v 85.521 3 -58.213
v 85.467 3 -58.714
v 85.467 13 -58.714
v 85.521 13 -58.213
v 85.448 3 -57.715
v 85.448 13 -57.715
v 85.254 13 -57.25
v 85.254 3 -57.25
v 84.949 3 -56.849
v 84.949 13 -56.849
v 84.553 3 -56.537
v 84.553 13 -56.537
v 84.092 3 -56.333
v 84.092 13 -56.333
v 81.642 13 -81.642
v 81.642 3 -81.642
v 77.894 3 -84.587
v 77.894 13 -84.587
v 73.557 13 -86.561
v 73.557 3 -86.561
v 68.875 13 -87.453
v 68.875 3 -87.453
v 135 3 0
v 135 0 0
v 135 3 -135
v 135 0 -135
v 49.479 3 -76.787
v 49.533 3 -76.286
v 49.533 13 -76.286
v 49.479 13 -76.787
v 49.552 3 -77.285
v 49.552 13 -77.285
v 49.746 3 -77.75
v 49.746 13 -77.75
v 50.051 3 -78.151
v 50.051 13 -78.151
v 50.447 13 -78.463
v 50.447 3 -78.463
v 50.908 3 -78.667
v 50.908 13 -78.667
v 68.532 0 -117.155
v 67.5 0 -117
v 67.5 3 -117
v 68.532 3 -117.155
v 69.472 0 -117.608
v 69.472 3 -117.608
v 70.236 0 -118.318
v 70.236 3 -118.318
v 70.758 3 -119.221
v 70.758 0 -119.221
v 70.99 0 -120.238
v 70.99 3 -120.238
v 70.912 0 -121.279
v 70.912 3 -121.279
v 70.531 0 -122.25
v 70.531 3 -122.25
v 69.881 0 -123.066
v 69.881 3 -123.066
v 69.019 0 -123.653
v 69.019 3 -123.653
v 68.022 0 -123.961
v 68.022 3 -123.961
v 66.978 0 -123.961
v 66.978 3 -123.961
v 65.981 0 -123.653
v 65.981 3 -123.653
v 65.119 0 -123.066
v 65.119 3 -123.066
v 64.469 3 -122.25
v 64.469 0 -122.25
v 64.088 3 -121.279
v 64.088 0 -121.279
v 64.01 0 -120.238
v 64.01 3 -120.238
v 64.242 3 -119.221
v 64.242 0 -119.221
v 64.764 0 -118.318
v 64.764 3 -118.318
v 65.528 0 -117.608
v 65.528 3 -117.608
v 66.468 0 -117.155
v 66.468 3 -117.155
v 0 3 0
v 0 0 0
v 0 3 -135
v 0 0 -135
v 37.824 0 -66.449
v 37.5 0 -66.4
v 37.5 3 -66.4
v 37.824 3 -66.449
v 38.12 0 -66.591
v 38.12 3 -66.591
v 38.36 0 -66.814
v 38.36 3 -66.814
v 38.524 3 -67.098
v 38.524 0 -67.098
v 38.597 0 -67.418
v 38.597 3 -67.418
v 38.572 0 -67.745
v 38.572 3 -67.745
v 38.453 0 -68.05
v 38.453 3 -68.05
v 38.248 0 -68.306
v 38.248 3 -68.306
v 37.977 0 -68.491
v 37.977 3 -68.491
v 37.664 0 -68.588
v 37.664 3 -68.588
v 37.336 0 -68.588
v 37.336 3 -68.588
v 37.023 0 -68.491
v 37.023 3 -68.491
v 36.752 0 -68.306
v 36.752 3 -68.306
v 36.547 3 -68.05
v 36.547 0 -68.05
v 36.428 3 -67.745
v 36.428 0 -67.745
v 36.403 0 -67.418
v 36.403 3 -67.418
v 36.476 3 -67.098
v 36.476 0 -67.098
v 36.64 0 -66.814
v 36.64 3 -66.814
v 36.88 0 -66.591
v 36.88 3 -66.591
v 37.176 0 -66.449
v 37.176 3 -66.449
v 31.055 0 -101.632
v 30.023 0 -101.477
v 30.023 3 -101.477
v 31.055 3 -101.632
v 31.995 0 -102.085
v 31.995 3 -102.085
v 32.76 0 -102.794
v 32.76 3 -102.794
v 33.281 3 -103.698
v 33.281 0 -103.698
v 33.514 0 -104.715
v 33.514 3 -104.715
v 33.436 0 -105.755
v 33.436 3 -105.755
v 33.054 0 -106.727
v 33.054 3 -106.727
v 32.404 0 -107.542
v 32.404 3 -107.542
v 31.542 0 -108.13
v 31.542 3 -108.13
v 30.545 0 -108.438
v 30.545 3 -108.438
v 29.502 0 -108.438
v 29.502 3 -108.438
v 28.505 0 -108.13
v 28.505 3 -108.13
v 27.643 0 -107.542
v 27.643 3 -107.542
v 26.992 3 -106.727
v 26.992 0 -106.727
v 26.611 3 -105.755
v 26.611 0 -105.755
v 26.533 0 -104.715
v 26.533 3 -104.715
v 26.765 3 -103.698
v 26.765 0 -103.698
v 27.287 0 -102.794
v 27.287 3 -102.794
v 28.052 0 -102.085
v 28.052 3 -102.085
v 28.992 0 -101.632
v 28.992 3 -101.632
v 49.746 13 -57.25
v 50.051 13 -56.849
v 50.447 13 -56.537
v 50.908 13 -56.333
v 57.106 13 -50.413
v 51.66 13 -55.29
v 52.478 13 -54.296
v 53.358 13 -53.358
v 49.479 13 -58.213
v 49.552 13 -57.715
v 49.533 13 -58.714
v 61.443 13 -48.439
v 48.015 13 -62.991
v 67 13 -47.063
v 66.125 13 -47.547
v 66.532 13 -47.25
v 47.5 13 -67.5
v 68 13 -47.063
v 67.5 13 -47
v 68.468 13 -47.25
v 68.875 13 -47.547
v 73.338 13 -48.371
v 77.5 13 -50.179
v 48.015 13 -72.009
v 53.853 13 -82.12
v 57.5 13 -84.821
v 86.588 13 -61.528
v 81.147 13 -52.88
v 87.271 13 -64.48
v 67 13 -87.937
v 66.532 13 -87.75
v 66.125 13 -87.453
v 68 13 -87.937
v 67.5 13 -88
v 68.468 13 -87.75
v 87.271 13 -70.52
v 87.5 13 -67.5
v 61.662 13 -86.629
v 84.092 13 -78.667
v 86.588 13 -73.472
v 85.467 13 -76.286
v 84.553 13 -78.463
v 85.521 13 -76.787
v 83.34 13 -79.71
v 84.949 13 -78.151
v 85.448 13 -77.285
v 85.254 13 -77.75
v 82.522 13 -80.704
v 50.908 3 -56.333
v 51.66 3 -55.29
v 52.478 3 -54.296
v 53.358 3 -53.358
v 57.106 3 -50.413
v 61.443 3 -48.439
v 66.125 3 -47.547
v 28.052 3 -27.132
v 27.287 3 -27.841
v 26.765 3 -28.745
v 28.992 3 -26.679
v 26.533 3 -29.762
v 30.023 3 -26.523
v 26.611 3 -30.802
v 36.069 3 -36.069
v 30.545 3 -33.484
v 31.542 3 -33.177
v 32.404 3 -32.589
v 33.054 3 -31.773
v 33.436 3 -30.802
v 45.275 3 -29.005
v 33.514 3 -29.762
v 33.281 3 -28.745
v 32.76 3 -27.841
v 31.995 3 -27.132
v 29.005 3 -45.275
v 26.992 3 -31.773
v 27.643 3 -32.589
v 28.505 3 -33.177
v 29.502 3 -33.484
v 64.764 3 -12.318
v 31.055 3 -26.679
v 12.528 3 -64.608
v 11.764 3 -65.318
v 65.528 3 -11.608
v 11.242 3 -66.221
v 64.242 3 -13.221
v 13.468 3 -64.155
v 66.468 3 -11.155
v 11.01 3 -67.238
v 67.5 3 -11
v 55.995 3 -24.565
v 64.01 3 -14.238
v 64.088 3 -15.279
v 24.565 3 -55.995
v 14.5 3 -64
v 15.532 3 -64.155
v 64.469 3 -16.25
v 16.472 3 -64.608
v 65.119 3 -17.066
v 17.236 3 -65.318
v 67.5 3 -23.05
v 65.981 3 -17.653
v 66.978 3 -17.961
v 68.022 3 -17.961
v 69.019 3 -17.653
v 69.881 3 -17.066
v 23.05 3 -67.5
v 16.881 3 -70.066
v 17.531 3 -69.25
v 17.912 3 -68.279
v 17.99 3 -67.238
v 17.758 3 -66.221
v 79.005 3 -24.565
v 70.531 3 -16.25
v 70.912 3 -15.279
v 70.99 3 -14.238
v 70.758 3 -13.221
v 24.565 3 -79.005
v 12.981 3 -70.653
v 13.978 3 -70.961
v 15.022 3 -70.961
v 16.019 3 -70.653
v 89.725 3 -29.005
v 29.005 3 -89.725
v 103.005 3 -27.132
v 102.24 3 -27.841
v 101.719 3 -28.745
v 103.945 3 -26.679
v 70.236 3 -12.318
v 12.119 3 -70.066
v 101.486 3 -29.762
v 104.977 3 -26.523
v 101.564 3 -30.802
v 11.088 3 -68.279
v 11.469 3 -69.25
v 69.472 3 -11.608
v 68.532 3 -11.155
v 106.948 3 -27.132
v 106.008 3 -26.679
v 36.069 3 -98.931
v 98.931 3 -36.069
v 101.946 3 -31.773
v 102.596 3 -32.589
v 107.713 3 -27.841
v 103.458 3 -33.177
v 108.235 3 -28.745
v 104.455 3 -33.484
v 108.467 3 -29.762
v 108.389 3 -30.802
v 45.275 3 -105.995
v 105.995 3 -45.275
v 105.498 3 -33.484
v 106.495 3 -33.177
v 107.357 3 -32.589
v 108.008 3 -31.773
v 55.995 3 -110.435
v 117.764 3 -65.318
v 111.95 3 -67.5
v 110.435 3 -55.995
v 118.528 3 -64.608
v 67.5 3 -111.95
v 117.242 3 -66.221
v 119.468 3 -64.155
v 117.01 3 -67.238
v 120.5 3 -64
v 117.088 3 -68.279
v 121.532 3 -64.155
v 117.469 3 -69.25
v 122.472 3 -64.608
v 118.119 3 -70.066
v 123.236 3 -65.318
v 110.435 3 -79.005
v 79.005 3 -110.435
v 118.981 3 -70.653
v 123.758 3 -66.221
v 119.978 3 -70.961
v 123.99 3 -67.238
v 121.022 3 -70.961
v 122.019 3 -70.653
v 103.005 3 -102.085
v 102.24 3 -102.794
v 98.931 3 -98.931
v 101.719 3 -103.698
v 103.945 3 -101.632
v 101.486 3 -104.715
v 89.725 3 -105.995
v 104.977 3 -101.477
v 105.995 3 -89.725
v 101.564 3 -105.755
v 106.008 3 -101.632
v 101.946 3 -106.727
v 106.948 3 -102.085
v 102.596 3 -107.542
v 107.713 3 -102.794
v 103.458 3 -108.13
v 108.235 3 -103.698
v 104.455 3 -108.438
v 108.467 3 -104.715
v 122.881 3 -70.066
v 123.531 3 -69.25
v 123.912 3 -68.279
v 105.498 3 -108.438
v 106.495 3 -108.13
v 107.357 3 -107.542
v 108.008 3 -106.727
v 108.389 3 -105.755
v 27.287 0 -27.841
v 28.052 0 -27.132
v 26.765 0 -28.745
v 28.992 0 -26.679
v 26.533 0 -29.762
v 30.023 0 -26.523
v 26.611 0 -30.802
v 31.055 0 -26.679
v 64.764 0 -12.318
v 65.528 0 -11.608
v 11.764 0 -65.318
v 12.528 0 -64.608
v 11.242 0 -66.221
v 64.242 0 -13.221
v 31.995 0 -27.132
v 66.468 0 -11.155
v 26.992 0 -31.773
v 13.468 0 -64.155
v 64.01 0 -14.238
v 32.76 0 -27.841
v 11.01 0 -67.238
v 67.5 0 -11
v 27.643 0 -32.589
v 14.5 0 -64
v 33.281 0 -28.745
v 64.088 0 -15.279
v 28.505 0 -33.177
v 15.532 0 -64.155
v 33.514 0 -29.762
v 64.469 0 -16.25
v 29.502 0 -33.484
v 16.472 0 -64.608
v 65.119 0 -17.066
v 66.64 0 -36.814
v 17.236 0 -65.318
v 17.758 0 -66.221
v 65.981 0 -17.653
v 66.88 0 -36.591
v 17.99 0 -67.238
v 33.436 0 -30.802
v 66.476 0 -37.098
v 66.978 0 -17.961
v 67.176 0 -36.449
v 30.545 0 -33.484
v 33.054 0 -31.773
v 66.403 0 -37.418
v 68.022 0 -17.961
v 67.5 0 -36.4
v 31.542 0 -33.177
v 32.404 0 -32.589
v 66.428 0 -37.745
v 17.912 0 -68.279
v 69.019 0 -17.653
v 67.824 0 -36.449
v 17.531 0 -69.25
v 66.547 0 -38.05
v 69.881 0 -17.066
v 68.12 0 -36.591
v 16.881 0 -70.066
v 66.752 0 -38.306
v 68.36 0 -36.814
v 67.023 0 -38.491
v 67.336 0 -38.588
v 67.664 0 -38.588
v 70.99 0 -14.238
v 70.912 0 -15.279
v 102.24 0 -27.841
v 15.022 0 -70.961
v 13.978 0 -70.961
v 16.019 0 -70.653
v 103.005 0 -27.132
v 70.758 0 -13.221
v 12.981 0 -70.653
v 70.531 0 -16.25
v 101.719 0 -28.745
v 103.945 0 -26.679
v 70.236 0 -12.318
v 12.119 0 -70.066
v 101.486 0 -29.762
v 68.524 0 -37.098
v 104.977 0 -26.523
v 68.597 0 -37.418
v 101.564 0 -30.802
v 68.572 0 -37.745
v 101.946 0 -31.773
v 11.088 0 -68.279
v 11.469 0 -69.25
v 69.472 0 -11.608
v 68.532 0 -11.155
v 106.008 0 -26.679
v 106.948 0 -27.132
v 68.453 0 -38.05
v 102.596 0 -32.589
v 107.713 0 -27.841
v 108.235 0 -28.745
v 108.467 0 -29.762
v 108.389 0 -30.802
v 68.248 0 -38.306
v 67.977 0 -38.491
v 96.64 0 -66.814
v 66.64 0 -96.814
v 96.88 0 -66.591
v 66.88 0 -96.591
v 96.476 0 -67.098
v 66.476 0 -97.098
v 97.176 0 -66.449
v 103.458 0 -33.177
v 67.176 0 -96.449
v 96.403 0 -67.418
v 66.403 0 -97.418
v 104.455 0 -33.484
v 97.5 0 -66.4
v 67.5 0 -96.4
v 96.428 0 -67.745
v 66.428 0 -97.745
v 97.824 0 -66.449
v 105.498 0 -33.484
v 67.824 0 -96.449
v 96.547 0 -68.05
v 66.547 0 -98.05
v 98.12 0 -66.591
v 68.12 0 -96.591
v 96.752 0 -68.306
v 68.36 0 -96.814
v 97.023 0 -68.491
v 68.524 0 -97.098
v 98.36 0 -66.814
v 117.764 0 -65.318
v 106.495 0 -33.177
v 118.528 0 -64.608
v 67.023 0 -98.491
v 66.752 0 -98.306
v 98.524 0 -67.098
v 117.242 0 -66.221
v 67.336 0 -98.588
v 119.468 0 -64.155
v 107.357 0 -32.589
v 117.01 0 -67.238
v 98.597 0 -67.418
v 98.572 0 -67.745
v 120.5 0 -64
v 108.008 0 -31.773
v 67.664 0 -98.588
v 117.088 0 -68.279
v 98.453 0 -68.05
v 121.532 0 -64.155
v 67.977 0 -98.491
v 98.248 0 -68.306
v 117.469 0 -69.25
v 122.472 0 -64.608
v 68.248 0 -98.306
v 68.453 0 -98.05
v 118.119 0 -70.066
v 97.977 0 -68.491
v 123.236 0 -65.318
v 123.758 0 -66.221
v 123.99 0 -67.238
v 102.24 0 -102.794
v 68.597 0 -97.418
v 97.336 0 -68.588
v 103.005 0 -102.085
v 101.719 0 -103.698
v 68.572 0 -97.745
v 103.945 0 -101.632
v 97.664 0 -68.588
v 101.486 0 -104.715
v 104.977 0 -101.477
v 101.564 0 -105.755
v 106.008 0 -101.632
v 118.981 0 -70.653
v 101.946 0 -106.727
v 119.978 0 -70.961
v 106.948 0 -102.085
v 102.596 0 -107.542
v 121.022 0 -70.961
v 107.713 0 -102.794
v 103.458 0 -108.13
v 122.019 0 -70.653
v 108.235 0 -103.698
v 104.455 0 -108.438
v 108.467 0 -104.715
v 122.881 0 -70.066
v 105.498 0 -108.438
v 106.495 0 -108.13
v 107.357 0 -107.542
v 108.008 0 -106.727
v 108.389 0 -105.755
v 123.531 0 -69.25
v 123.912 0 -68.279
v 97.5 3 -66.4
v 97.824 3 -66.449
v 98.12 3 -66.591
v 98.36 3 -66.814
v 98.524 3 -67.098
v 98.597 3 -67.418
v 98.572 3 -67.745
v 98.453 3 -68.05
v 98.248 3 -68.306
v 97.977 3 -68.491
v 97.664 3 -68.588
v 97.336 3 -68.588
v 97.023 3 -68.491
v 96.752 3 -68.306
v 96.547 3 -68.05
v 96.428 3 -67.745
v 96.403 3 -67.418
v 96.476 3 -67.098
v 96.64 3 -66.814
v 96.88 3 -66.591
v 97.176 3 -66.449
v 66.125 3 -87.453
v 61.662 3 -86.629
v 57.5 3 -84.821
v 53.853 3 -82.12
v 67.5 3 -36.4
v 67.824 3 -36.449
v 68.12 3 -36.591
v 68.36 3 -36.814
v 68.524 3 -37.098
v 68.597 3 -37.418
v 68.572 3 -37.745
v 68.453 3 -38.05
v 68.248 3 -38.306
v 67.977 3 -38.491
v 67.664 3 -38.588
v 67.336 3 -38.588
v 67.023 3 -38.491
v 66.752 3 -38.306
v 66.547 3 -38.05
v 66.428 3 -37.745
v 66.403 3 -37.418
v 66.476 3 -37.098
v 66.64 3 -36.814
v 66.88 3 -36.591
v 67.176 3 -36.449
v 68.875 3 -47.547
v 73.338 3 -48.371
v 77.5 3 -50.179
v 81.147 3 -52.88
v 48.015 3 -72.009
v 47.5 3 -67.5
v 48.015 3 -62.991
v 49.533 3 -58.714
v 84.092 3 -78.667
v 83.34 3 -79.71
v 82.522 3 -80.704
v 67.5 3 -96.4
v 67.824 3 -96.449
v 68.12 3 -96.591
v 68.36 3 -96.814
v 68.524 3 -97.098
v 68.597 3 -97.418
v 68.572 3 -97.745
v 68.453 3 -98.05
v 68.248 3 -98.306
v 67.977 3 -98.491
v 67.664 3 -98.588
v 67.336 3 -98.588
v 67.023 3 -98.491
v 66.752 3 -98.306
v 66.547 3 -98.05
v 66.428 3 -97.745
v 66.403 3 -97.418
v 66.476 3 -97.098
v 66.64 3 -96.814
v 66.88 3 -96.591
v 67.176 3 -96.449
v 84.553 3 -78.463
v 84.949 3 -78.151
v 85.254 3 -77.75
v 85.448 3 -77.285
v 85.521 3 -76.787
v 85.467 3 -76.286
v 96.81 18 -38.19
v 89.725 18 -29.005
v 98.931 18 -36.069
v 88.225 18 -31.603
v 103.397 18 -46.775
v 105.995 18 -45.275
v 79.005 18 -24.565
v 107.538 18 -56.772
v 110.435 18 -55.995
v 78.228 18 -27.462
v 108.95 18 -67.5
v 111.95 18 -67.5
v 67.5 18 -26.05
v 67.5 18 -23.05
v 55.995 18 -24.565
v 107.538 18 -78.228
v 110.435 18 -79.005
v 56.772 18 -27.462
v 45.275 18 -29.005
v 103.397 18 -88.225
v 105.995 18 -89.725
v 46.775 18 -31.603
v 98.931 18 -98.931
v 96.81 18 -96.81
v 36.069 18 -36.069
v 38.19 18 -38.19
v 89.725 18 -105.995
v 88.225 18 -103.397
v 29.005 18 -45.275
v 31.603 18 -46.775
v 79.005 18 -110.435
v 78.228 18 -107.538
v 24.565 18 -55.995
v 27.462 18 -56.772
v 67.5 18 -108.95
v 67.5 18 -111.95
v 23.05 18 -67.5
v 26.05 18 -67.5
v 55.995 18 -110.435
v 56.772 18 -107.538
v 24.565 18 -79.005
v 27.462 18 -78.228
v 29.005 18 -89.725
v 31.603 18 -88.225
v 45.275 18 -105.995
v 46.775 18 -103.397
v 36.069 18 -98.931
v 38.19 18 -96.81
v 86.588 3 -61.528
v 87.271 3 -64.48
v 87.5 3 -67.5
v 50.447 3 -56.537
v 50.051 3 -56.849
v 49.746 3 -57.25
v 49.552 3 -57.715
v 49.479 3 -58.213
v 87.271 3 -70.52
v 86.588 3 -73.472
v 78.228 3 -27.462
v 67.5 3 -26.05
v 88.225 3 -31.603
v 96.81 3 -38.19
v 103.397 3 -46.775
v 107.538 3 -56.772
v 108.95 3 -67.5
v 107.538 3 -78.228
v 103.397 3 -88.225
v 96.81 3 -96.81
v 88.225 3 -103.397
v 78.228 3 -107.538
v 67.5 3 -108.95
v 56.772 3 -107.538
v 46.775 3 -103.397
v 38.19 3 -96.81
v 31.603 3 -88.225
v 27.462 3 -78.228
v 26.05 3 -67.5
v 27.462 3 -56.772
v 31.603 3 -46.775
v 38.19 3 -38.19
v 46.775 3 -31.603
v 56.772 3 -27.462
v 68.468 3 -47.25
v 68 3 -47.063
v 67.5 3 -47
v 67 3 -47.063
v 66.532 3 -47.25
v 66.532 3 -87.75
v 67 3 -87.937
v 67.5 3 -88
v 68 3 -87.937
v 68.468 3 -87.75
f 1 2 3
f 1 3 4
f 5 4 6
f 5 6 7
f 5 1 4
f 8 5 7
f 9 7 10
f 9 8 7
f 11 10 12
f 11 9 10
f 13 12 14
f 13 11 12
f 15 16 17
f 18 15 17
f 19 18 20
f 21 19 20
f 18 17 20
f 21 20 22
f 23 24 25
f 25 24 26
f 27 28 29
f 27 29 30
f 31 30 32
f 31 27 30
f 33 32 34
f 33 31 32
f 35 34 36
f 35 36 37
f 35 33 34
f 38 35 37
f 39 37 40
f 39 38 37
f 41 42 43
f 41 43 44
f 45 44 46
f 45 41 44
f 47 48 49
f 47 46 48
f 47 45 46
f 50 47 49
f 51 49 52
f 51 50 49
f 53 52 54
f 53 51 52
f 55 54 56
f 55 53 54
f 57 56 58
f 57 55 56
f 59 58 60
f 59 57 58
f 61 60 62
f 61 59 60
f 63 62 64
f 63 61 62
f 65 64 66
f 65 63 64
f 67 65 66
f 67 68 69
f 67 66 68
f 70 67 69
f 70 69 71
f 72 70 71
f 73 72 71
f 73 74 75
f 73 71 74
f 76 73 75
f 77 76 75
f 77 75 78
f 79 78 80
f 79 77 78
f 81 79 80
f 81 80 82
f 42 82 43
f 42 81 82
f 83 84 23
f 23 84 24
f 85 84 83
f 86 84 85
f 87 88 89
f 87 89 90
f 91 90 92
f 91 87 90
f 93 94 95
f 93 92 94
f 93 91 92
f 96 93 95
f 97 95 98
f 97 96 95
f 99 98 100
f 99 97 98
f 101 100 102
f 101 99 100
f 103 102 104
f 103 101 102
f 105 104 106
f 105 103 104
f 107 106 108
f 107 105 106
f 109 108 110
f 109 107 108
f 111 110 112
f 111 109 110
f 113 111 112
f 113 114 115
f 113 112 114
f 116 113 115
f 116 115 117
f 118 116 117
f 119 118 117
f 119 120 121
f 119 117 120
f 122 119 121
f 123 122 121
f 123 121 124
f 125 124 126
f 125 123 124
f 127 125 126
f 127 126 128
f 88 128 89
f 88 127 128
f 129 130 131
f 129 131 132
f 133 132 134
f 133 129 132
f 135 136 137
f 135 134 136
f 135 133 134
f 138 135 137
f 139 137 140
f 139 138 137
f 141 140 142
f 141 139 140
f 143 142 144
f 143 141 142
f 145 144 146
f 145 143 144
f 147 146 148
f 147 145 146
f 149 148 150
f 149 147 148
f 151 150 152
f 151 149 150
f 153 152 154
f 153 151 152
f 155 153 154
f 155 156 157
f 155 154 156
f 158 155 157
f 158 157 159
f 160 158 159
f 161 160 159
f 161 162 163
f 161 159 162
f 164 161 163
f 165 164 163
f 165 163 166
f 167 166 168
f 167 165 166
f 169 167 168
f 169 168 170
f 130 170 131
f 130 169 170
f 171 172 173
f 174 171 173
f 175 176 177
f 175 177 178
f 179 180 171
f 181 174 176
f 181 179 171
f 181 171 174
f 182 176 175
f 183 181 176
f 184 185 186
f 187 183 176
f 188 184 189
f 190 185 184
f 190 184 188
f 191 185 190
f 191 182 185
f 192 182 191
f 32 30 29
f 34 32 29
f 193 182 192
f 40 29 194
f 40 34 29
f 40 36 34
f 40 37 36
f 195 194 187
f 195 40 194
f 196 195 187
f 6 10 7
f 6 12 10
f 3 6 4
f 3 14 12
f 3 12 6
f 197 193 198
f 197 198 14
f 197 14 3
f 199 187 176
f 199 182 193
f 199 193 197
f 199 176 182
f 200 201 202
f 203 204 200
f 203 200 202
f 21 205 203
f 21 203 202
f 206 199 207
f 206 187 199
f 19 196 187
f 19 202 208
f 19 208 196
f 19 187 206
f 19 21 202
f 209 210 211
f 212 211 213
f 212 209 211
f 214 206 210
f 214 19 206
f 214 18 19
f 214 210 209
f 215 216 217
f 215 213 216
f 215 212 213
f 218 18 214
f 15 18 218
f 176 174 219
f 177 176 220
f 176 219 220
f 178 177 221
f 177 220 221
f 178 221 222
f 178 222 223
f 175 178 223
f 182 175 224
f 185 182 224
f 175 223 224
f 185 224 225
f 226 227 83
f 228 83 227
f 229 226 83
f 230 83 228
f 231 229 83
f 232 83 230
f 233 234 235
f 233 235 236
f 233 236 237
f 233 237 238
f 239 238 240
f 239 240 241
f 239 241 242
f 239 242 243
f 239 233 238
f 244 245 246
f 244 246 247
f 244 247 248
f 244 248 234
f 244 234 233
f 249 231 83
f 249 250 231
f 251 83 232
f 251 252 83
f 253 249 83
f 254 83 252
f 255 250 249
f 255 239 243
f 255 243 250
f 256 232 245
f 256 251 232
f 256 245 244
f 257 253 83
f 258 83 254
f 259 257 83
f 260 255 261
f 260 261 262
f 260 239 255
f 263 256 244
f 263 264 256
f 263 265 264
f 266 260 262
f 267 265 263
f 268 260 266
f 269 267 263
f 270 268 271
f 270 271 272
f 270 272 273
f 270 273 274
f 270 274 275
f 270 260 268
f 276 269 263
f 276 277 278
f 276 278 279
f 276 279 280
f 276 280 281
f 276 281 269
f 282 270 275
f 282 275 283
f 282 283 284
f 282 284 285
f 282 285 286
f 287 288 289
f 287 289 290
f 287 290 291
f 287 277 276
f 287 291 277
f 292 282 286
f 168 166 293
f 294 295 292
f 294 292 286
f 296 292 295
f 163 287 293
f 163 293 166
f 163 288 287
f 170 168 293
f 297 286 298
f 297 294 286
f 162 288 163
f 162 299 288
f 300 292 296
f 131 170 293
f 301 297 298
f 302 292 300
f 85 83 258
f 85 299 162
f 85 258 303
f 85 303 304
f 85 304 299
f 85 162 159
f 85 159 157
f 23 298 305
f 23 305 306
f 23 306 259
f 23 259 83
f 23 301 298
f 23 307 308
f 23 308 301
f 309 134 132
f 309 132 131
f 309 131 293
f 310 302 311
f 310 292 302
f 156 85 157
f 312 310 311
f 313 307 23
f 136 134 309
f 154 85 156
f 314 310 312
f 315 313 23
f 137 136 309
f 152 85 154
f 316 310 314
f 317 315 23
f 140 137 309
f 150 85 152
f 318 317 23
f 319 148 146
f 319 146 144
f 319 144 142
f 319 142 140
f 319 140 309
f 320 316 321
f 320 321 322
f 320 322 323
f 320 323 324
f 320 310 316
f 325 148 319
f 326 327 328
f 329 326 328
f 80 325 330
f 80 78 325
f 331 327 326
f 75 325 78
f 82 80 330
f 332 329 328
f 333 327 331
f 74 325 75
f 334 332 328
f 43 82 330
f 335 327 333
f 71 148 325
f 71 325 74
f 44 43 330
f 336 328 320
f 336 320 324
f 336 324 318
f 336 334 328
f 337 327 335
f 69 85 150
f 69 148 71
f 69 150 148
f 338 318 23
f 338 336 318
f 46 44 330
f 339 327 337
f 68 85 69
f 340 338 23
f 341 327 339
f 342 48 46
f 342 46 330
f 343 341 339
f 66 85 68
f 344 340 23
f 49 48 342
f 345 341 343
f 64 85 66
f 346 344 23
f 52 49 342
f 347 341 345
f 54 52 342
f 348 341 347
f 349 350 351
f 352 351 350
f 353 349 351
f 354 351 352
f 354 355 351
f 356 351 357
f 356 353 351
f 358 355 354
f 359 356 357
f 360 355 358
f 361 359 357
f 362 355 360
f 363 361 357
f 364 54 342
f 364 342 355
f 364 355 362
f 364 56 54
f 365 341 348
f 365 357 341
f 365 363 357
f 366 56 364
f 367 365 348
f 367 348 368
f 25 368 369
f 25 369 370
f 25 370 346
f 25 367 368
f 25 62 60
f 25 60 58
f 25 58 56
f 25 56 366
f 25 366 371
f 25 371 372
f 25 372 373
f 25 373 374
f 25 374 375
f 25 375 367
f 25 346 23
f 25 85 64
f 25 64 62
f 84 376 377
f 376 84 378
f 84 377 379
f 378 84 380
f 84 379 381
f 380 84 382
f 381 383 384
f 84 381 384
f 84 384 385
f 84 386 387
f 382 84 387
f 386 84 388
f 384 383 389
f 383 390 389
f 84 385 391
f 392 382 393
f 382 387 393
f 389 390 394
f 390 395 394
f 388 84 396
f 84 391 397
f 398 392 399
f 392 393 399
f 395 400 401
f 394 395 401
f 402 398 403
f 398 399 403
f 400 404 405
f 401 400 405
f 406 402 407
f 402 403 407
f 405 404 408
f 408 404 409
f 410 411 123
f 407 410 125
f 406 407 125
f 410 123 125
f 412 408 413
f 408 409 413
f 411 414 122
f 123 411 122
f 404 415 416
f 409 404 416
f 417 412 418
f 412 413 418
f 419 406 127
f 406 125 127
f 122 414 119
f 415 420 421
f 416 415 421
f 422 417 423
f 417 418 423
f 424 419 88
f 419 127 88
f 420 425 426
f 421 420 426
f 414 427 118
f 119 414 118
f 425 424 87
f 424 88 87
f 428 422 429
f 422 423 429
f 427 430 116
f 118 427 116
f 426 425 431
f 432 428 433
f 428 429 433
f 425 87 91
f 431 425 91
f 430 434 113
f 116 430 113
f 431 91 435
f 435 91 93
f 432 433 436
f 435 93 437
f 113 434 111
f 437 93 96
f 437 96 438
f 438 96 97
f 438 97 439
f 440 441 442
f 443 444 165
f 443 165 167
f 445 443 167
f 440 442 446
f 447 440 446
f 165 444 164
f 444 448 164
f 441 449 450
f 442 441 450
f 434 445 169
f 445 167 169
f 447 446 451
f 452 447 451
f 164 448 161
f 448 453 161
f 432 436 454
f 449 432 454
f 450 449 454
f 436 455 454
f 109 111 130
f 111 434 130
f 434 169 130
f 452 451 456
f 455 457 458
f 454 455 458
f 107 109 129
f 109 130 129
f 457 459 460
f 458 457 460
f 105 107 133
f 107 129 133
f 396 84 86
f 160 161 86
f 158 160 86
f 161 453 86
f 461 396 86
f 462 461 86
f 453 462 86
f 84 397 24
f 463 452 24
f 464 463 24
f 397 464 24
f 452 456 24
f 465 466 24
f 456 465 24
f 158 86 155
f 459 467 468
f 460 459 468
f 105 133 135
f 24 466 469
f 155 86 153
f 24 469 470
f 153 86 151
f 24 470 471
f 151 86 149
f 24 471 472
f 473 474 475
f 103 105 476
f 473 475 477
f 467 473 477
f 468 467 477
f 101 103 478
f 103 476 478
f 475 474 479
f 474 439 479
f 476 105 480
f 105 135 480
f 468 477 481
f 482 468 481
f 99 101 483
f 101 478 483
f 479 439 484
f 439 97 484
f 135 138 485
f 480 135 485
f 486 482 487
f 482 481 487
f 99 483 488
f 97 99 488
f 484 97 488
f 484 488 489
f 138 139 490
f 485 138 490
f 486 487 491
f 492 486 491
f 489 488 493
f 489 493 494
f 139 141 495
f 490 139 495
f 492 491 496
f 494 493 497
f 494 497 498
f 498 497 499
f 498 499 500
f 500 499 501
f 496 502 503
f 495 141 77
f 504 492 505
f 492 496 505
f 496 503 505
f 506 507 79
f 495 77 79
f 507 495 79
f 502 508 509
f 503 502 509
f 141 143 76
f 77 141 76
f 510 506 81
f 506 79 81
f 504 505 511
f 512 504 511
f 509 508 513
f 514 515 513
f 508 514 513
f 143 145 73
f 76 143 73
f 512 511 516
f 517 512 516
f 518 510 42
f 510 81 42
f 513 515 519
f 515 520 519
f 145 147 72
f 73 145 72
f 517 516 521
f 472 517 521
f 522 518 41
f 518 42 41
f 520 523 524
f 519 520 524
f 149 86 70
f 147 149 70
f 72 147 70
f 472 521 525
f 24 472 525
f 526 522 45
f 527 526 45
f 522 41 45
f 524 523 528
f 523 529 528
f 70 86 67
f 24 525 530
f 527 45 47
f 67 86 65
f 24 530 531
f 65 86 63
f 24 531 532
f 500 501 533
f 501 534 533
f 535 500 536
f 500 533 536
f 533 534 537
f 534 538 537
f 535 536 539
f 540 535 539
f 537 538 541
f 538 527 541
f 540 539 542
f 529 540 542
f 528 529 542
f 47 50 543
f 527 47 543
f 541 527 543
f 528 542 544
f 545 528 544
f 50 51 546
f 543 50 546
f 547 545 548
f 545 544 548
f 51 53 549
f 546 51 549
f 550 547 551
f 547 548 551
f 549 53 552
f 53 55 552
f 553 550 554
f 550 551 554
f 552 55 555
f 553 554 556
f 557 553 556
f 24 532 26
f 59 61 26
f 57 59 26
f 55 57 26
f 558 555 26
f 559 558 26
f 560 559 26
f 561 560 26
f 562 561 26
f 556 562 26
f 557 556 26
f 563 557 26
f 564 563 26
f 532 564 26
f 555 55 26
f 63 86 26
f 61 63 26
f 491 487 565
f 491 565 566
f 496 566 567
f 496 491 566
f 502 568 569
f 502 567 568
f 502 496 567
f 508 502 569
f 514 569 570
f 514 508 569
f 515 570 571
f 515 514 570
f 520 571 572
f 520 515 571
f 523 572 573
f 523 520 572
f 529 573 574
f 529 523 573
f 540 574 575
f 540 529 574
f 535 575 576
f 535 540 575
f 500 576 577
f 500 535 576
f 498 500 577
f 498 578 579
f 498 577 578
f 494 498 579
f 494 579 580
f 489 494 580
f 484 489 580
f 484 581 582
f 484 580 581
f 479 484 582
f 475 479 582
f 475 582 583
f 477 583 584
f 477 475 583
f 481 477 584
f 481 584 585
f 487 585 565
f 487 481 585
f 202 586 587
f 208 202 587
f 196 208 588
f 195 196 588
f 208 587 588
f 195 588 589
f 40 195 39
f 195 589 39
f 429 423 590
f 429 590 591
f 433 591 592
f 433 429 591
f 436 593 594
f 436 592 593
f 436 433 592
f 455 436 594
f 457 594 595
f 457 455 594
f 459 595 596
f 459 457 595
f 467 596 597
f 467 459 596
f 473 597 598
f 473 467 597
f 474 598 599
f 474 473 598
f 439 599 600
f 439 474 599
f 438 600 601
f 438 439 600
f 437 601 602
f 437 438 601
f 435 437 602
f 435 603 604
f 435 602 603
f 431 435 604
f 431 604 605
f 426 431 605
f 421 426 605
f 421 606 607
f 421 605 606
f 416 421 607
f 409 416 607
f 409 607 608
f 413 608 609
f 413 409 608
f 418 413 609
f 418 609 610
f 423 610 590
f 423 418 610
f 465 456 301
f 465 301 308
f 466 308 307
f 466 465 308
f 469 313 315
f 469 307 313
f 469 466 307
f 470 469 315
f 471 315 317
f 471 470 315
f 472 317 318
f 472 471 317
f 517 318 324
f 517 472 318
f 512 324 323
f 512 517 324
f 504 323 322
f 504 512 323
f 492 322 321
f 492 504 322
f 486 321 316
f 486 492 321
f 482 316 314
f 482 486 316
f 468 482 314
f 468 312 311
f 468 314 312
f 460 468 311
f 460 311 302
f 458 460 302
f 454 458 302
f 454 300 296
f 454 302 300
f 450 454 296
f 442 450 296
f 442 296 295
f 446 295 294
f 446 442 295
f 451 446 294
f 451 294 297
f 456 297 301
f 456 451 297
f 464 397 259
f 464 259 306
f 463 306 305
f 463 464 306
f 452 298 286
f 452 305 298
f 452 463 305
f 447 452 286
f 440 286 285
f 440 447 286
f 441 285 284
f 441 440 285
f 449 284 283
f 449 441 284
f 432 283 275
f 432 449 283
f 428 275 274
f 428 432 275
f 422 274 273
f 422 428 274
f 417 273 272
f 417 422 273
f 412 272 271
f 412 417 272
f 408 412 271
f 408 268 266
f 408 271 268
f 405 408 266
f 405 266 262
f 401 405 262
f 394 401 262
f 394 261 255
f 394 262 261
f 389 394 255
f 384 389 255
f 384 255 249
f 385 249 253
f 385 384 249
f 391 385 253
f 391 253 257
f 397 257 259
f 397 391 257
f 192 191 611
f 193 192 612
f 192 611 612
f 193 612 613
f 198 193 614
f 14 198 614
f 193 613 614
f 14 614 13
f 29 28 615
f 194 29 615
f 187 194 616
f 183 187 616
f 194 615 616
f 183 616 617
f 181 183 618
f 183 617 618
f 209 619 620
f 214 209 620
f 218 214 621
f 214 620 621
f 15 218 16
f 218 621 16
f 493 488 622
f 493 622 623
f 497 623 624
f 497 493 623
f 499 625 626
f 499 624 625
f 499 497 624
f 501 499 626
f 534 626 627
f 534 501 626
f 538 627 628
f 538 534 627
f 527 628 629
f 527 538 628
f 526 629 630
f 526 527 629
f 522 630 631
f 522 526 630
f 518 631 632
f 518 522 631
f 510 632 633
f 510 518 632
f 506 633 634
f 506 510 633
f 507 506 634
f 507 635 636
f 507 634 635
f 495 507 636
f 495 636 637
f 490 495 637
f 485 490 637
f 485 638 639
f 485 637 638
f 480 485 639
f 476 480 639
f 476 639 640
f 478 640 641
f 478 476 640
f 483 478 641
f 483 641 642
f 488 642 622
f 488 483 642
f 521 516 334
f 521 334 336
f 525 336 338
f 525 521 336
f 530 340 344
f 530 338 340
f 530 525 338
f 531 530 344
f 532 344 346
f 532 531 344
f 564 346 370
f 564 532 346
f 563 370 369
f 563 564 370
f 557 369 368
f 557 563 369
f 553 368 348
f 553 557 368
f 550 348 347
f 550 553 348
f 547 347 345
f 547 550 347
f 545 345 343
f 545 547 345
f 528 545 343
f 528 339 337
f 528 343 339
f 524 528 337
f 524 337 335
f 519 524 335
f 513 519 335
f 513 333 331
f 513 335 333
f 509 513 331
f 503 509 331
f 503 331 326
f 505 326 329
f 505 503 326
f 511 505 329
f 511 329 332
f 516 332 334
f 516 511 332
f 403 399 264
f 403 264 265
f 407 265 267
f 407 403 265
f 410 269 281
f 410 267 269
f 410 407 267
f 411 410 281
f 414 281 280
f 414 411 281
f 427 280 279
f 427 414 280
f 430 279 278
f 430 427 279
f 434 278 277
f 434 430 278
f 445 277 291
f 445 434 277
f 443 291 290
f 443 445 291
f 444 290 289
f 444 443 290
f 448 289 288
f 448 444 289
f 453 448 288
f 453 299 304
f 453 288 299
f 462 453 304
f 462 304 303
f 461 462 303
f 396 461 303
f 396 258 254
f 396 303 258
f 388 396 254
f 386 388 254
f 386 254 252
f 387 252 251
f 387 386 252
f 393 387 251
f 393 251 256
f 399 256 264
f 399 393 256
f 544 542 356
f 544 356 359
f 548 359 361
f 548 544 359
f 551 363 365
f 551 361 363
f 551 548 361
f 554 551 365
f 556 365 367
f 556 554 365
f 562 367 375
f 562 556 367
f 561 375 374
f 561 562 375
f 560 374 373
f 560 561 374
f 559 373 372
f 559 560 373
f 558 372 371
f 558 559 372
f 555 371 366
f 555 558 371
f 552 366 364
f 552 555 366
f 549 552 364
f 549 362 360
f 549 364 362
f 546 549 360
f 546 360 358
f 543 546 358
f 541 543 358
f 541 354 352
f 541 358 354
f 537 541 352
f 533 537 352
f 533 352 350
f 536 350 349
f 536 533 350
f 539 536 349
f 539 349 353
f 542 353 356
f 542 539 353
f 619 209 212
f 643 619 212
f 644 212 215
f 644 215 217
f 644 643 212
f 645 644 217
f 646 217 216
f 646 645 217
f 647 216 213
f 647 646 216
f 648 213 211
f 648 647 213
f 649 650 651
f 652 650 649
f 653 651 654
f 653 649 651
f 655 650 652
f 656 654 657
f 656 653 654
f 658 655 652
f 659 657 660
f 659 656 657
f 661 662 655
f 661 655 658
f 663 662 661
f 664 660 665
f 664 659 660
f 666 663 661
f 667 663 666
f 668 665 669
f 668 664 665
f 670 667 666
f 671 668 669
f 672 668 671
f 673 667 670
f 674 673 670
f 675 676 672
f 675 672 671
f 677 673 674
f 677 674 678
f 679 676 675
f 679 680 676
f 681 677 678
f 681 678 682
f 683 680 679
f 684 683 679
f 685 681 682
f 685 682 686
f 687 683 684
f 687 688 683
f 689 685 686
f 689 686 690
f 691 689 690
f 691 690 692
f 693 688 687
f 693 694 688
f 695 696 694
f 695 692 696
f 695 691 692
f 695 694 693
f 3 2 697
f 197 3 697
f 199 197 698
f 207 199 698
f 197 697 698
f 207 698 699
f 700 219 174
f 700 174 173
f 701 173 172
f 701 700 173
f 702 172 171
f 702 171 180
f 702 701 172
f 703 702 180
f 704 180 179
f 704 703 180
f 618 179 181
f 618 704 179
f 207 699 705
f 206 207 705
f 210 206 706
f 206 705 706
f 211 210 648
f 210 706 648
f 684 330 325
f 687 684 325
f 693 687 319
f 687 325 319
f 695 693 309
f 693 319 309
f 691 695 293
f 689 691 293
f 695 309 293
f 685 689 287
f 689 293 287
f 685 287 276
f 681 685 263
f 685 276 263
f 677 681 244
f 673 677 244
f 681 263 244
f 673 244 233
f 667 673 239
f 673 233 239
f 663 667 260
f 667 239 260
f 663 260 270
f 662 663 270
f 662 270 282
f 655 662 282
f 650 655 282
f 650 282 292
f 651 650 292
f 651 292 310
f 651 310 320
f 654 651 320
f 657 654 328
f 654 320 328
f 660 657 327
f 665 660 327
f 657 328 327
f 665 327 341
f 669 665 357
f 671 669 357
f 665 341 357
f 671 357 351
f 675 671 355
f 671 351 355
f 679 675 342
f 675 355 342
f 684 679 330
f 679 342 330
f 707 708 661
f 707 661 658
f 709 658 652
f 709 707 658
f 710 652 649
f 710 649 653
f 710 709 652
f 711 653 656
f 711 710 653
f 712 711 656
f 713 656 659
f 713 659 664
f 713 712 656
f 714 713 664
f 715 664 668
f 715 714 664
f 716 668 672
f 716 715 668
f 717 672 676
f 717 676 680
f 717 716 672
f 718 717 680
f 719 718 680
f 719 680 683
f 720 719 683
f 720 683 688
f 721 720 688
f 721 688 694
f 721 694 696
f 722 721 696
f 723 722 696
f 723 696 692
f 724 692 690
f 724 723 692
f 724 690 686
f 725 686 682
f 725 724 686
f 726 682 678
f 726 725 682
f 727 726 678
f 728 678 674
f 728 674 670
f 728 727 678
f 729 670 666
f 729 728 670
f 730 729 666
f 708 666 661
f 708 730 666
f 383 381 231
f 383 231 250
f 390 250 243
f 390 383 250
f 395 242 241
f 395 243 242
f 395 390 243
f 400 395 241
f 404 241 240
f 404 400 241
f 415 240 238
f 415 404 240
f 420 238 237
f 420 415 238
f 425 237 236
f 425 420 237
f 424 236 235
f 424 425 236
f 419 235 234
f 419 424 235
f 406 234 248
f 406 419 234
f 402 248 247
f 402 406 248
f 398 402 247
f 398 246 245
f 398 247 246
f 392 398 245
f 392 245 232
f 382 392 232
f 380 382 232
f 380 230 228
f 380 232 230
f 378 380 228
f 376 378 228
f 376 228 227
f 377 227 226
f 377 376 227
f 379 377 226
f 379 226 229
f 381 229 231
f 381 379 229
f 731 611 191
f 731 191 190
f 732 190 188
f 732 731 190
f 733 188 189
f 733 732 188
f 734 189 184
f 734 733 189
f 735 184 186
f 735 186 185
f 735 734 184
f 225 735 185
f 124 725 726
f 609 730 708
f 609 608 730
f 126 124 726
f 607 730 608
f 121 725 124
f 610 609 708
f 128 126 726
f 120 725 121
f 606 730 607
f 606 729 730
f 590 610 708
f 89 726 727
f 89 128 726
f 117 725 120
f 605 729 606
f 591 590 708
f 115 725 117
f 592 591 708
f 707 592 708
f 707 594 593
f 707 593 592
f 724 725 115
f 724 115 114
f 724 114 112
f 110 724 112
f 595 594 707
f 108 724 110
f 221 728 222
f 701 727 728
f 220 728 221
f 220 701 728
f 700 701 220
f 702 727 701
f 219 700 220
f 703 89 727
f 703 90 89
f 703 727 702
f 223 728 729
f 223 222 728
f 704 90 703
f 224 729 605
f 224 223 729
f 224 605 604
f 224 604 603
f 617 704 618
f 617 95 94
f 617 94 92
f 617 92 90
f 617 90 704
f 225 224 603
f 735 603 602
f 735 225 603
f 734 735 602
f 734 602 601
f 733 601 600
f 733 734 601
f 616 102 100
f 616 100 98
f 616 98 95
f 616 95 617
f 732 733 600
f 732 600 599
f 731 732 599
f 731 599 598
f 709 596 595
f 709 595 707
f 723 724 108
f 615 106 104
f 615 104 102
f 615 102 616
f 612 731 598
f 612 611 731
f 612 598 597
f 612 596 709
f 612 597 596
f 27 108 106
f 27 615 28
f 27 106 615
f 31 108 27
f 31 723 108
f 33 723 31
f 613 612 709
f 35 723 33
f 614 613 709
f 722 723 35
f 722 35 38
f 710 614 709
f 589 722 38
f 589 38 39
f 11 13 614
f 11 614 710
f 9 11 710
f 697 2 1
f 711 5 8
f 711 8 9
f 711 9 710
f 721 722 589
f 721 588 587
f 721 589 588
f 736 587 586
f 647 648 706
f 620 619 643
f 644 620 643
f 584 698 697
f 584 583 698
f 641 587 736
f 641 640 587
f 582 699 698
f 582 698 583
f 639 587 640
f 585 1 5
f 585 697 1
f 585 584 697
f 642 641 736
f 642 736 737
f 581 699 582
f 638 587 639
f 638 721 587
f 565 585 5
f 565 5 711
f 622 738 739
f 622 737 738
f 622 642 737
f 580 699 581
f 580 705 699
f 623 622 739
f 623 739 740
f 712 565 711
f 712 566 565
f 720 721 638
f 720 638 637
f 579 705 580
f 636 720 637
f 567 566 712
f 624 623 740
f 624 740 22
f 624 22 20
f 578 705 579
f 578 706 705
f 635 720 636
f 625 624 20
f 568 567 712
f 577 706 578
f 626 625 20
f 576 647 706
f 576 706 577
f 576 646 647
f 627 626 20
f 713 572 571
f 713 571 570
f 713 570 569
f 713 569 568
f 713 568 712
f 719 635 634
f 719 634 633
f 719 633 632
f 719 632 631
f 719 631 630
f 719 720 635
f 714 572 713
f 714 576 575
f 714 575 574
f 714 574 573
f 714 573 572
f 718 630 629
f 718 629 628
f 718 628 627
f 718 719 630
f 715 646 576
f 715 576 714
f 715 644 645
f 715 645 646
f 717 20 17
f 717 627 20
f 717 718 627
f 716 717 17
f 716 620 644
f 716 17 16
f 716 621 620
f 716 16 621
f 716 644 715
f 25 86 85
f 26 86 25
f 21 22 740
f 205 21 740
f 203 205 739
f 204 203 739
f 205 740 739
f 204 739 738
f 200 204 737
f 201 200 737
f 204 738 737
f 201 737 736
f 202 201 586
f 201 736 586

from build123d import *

# Parameters (mm, degrees)
SKETCH1_W               = 135
SKETCH1_H               = 135
BOSS_EXTRUDE1_DEPTH     = 3
BOSS_EXTRUDE2_DEPTH     = 10
SKETCH3_R               = 44.45
SKETCH3_R_2             = 41.45
BOSS_EXTRUDE3_DEPTH     = 15
CUT_EXTRUDE1_DEPTH      = 192.507180022
CUT_EXTRUDE1_DEPTH_BACK = 192.507180022
SKETCH4_R               = 1.1
CUT_EXTRUDE2_DEPTH      = 192.507180022
CUT_EXTRUDE2_DEPTH_BACK = 192.507180022
SKETCH5_R               = 3.5


with BuildPart() as part:
    # Sketch1 → Boss-Extrude1 (new body)
    with BuildSketch(Plane(origin=(0, 0, 0), x_dir=(1, 0, 0), z_dir=(0, 1, 0))):
        with Locations((67.5, 67.5)):
            Rectangle(SKETCH1_W, SKETCH1_H)
    extrude(amount=BOSS_EXTRUDE1_DEPTH)

    # Sketch2 → Boss-Extrude2 (add)
    with BuildSketch(Plane(origin=(0, 3, 0), x_dir=(1, 0, 0), z_dir=(0, 1, 0))):
        with BuildLine():
            ThreePointArc((50.907776173, 56.333169273), (52.06098052, 54.786358606), (53.357864376, 53.357864376))
            Line((53.357864376, 53.357864376), (81.642135624, 81.642135624))
            ThreePointArc((81.642135624, 81.642135624), (75.784522289, 85.703480174), (68.874647176, 87.452702703))
            ThreePointArc((68.874647176, 87.452702703), (67.5, 87.5), (66.125352824, 87.452702703))
            ThreePointArc((66.125352824, 87.452702703), (57.5, 84.820508076), (50.907776173, 78.666830727))
            ThreePointArc((50.907776173, 78.666830727), (50.179491924, 77.5), (49.533128997, 76.285871976))
            ThreePointArc((49.533128997, 76.285871976), (47.5, 67.5), (49.533128997, 58.714128024))
            ThreePointArc((49.533128997, 58.714128024), (50.179491924, 57.5), (50.907776173, 56.333169273))
        make_face()
        with BuildLine():
            Line((81.642135624, 81.642135624), (53.357864376, 53.357864376))
            ThreePointArc((53.357864376, 53.357864376), (59.215477711, 49.296519826), (66.125352824, 47.547297297))
            ThreePointArc((66.125352824, 47.547297297), (67.5, 47.5), (68.874647176, 47.547297297))
            ThreePointArc((68.874647176, 47.547297297), (77.5, 50.179491924), (84.092223827, 56.333169273))
            ThreePointArc((84.092223827, 56.333169273), (84.820508076, 57.5), (85.466871003, 58.714128024))
            ThreePointArc((85.466871003, 58.714128024), (86.985089428, 62.990976827), (87.5, 67.5))
            ThreePointArc((87.5, 67.5), (86.985089428, 72.009023173), (85.466871003, 76.285871976))
            ThreePointArc((85.466871003, 76.285871976), (84.820508076, 77.5), (84.092223827, 78.666830727))
            ThreePointArc((84.092223827, 78.666830727), (82.93901948, 80.213641394), (81.642135624, 81.642135624))
        make_face()
        with BuildLine():
            ThreePointArc((66.125352824, 87.452702703), (67.5, 87.5), (68.874647176, 87.452702703))
            ThreePointArc((68.874647176, 87.452702703), (67.5, 88), (66.125352824, 87.452702703))
        make_face()
        with BuildLine():
            ThreePointArc((68.874647176, 47.547297297), (67.5, 47), (66.125352824, 47.547297297))
            ThreePointArc((66.125352824, 47.547297297), (67.5, 47.5), (68.874647176, 47.547297297))
        make_face()
        with BuildLine():
            ThreePointArc((50.907776173, 56.333169273), (49.746479222, 57.25), (49.533128997, 58.714128024))
            ThreePointArc((49.533128997, 58.714128024), (50.179491924, 57.5), (50.907776173, 56.333169273))
        make_face()
        with BuildLine():
            ThreePointArc((85.466871003, 58.714128024), (85.253520778, 57.25), (84.092223827, 56.333169273))
            ThreePointArc((84.092223827, 56.333169273), (84.820508076, 57.5), (85.466871003, 58.714128024))
        make_face()
        with BuildLine():
            ThreePointArc((84.092223827, 78.666830727), (85.253520778, 77.75), (85.466871003, 76.285871976))
            ThreePointArc((85.466871003, 76.285871976), (84.820508076, 77.5), (84.092223827, 78.666830727))
        make_face()
        with BuildLine():
            ThreePointArc((49.533128997, 76.285871976), (49.746479222, 77.75), (50.907776173, 78.666830727))
            ThreePointArc((50.907776173, 78.666830727), (50.179491924, 77.5), (49.533128997, 76.285871976))
        make_face()
    extrude(amount=BOSS_EXTRUDE2_DEPTH)

    # Sketch3 → Boss-Extrude3 (add)
    with BuildSketch(Plane(origin=(0, 3, 0), x_dir=(1, 0, 0), z_dir=(0, 1, 0))):
        with Locations(Location((67.5, 67.5, 0), (0, 0, 90))):
            Circle(SKETCH3_R)
        with Locations(Location((67.5, 67.5, 0), (0, 0, 270))):
            Circle(SKETCH3_R_2, mode=Mode.SUBTRACT)
    extrude(amount=BOSS_EXTRUDE3_DEPTH)

    # Sketch4 → Cut-Extrude1 (cut, two sides: drawn at the far end of the back side and taken through both)
    with BuildSketch(Plane(origin=(0, 3, 0), x_dir=(1, 0, 0), z_dir=(0, 1, 0)).offset(-CUT_EXTRUDE1_DEPTH_BACK)):
        with Locations(Location((67.5, 97.5, 0), (0, 0, 270))):
            Circle(SKETCH4_R)
        with Locations(Location((97.5, 67.5, 0), (0, 0, 270))):
            Circle(SKETCH4_R)
        with Locations(Location((67.5, 37.5, 0), (0, 0, 270))):
            Circle(SKETCH4_R)
        with Locations(Location((37.5, 67.5, 0), (0, 0, 270))):
            Circle(SKETCH4_R)
    extrude(amount=CUT_EXTRUDE1_DEPTH + CUT_EXTRUDE1_DEPTH_BACK, mode=Mode.SUBTRACT)

    # Sketch5 → Cut-Extrude2 (cut, two sides: drawn at the far end of the back side and taken through both)
    with BuildSketch(Plane(origin=(0, 3, 0), x_dir=(1, 0, 0), z_dir=(0, 1, 0)).offset(-CUT_EXTRUDE2_DEPTH_BACK)):
        with Locations(Location((67.5, 120.5, 0), (0, 0, 270))):
            Circle(SKETCH5_R)
        with Locations(Location((104.976659403, 104.976659403, 0), (0, 0, 270))):
            Circle(SKETCH5_R)
        with Locations(Location((120.5, 67.5, 0), (0, 0, 270))):
            Circle(SKETCH5_R)
        with Locations(Location((104.976659403, 30.023340597, 0), (0, 0, 270))):
            Circle(SKETCH5_R)
        with Locations(Location((67.5, 14.5, 0), (0, 0, 270))):
            Circle(SKETCH5_R)
        with Locations(Location((30.023340597, 30.023340597, 0), (0, 0, 270))):
            Circle(SKETCH5_R)
        with Locations(Location((14.5, 67.5, 0), (0, 0, 270))):
            Circle(SKETCH5_R)
        with Locations(Location((30.023340597, 104.976659403, 0), (0, 0, 270))):
            Circle(SKETCH5_R)
    extrude(amount=CUT_EXTRUDE2_DEPTH + CUT_EXTRUDE2_DEPTH_BACK, mode=Mode.SUBTRACT)


solid = part.part
